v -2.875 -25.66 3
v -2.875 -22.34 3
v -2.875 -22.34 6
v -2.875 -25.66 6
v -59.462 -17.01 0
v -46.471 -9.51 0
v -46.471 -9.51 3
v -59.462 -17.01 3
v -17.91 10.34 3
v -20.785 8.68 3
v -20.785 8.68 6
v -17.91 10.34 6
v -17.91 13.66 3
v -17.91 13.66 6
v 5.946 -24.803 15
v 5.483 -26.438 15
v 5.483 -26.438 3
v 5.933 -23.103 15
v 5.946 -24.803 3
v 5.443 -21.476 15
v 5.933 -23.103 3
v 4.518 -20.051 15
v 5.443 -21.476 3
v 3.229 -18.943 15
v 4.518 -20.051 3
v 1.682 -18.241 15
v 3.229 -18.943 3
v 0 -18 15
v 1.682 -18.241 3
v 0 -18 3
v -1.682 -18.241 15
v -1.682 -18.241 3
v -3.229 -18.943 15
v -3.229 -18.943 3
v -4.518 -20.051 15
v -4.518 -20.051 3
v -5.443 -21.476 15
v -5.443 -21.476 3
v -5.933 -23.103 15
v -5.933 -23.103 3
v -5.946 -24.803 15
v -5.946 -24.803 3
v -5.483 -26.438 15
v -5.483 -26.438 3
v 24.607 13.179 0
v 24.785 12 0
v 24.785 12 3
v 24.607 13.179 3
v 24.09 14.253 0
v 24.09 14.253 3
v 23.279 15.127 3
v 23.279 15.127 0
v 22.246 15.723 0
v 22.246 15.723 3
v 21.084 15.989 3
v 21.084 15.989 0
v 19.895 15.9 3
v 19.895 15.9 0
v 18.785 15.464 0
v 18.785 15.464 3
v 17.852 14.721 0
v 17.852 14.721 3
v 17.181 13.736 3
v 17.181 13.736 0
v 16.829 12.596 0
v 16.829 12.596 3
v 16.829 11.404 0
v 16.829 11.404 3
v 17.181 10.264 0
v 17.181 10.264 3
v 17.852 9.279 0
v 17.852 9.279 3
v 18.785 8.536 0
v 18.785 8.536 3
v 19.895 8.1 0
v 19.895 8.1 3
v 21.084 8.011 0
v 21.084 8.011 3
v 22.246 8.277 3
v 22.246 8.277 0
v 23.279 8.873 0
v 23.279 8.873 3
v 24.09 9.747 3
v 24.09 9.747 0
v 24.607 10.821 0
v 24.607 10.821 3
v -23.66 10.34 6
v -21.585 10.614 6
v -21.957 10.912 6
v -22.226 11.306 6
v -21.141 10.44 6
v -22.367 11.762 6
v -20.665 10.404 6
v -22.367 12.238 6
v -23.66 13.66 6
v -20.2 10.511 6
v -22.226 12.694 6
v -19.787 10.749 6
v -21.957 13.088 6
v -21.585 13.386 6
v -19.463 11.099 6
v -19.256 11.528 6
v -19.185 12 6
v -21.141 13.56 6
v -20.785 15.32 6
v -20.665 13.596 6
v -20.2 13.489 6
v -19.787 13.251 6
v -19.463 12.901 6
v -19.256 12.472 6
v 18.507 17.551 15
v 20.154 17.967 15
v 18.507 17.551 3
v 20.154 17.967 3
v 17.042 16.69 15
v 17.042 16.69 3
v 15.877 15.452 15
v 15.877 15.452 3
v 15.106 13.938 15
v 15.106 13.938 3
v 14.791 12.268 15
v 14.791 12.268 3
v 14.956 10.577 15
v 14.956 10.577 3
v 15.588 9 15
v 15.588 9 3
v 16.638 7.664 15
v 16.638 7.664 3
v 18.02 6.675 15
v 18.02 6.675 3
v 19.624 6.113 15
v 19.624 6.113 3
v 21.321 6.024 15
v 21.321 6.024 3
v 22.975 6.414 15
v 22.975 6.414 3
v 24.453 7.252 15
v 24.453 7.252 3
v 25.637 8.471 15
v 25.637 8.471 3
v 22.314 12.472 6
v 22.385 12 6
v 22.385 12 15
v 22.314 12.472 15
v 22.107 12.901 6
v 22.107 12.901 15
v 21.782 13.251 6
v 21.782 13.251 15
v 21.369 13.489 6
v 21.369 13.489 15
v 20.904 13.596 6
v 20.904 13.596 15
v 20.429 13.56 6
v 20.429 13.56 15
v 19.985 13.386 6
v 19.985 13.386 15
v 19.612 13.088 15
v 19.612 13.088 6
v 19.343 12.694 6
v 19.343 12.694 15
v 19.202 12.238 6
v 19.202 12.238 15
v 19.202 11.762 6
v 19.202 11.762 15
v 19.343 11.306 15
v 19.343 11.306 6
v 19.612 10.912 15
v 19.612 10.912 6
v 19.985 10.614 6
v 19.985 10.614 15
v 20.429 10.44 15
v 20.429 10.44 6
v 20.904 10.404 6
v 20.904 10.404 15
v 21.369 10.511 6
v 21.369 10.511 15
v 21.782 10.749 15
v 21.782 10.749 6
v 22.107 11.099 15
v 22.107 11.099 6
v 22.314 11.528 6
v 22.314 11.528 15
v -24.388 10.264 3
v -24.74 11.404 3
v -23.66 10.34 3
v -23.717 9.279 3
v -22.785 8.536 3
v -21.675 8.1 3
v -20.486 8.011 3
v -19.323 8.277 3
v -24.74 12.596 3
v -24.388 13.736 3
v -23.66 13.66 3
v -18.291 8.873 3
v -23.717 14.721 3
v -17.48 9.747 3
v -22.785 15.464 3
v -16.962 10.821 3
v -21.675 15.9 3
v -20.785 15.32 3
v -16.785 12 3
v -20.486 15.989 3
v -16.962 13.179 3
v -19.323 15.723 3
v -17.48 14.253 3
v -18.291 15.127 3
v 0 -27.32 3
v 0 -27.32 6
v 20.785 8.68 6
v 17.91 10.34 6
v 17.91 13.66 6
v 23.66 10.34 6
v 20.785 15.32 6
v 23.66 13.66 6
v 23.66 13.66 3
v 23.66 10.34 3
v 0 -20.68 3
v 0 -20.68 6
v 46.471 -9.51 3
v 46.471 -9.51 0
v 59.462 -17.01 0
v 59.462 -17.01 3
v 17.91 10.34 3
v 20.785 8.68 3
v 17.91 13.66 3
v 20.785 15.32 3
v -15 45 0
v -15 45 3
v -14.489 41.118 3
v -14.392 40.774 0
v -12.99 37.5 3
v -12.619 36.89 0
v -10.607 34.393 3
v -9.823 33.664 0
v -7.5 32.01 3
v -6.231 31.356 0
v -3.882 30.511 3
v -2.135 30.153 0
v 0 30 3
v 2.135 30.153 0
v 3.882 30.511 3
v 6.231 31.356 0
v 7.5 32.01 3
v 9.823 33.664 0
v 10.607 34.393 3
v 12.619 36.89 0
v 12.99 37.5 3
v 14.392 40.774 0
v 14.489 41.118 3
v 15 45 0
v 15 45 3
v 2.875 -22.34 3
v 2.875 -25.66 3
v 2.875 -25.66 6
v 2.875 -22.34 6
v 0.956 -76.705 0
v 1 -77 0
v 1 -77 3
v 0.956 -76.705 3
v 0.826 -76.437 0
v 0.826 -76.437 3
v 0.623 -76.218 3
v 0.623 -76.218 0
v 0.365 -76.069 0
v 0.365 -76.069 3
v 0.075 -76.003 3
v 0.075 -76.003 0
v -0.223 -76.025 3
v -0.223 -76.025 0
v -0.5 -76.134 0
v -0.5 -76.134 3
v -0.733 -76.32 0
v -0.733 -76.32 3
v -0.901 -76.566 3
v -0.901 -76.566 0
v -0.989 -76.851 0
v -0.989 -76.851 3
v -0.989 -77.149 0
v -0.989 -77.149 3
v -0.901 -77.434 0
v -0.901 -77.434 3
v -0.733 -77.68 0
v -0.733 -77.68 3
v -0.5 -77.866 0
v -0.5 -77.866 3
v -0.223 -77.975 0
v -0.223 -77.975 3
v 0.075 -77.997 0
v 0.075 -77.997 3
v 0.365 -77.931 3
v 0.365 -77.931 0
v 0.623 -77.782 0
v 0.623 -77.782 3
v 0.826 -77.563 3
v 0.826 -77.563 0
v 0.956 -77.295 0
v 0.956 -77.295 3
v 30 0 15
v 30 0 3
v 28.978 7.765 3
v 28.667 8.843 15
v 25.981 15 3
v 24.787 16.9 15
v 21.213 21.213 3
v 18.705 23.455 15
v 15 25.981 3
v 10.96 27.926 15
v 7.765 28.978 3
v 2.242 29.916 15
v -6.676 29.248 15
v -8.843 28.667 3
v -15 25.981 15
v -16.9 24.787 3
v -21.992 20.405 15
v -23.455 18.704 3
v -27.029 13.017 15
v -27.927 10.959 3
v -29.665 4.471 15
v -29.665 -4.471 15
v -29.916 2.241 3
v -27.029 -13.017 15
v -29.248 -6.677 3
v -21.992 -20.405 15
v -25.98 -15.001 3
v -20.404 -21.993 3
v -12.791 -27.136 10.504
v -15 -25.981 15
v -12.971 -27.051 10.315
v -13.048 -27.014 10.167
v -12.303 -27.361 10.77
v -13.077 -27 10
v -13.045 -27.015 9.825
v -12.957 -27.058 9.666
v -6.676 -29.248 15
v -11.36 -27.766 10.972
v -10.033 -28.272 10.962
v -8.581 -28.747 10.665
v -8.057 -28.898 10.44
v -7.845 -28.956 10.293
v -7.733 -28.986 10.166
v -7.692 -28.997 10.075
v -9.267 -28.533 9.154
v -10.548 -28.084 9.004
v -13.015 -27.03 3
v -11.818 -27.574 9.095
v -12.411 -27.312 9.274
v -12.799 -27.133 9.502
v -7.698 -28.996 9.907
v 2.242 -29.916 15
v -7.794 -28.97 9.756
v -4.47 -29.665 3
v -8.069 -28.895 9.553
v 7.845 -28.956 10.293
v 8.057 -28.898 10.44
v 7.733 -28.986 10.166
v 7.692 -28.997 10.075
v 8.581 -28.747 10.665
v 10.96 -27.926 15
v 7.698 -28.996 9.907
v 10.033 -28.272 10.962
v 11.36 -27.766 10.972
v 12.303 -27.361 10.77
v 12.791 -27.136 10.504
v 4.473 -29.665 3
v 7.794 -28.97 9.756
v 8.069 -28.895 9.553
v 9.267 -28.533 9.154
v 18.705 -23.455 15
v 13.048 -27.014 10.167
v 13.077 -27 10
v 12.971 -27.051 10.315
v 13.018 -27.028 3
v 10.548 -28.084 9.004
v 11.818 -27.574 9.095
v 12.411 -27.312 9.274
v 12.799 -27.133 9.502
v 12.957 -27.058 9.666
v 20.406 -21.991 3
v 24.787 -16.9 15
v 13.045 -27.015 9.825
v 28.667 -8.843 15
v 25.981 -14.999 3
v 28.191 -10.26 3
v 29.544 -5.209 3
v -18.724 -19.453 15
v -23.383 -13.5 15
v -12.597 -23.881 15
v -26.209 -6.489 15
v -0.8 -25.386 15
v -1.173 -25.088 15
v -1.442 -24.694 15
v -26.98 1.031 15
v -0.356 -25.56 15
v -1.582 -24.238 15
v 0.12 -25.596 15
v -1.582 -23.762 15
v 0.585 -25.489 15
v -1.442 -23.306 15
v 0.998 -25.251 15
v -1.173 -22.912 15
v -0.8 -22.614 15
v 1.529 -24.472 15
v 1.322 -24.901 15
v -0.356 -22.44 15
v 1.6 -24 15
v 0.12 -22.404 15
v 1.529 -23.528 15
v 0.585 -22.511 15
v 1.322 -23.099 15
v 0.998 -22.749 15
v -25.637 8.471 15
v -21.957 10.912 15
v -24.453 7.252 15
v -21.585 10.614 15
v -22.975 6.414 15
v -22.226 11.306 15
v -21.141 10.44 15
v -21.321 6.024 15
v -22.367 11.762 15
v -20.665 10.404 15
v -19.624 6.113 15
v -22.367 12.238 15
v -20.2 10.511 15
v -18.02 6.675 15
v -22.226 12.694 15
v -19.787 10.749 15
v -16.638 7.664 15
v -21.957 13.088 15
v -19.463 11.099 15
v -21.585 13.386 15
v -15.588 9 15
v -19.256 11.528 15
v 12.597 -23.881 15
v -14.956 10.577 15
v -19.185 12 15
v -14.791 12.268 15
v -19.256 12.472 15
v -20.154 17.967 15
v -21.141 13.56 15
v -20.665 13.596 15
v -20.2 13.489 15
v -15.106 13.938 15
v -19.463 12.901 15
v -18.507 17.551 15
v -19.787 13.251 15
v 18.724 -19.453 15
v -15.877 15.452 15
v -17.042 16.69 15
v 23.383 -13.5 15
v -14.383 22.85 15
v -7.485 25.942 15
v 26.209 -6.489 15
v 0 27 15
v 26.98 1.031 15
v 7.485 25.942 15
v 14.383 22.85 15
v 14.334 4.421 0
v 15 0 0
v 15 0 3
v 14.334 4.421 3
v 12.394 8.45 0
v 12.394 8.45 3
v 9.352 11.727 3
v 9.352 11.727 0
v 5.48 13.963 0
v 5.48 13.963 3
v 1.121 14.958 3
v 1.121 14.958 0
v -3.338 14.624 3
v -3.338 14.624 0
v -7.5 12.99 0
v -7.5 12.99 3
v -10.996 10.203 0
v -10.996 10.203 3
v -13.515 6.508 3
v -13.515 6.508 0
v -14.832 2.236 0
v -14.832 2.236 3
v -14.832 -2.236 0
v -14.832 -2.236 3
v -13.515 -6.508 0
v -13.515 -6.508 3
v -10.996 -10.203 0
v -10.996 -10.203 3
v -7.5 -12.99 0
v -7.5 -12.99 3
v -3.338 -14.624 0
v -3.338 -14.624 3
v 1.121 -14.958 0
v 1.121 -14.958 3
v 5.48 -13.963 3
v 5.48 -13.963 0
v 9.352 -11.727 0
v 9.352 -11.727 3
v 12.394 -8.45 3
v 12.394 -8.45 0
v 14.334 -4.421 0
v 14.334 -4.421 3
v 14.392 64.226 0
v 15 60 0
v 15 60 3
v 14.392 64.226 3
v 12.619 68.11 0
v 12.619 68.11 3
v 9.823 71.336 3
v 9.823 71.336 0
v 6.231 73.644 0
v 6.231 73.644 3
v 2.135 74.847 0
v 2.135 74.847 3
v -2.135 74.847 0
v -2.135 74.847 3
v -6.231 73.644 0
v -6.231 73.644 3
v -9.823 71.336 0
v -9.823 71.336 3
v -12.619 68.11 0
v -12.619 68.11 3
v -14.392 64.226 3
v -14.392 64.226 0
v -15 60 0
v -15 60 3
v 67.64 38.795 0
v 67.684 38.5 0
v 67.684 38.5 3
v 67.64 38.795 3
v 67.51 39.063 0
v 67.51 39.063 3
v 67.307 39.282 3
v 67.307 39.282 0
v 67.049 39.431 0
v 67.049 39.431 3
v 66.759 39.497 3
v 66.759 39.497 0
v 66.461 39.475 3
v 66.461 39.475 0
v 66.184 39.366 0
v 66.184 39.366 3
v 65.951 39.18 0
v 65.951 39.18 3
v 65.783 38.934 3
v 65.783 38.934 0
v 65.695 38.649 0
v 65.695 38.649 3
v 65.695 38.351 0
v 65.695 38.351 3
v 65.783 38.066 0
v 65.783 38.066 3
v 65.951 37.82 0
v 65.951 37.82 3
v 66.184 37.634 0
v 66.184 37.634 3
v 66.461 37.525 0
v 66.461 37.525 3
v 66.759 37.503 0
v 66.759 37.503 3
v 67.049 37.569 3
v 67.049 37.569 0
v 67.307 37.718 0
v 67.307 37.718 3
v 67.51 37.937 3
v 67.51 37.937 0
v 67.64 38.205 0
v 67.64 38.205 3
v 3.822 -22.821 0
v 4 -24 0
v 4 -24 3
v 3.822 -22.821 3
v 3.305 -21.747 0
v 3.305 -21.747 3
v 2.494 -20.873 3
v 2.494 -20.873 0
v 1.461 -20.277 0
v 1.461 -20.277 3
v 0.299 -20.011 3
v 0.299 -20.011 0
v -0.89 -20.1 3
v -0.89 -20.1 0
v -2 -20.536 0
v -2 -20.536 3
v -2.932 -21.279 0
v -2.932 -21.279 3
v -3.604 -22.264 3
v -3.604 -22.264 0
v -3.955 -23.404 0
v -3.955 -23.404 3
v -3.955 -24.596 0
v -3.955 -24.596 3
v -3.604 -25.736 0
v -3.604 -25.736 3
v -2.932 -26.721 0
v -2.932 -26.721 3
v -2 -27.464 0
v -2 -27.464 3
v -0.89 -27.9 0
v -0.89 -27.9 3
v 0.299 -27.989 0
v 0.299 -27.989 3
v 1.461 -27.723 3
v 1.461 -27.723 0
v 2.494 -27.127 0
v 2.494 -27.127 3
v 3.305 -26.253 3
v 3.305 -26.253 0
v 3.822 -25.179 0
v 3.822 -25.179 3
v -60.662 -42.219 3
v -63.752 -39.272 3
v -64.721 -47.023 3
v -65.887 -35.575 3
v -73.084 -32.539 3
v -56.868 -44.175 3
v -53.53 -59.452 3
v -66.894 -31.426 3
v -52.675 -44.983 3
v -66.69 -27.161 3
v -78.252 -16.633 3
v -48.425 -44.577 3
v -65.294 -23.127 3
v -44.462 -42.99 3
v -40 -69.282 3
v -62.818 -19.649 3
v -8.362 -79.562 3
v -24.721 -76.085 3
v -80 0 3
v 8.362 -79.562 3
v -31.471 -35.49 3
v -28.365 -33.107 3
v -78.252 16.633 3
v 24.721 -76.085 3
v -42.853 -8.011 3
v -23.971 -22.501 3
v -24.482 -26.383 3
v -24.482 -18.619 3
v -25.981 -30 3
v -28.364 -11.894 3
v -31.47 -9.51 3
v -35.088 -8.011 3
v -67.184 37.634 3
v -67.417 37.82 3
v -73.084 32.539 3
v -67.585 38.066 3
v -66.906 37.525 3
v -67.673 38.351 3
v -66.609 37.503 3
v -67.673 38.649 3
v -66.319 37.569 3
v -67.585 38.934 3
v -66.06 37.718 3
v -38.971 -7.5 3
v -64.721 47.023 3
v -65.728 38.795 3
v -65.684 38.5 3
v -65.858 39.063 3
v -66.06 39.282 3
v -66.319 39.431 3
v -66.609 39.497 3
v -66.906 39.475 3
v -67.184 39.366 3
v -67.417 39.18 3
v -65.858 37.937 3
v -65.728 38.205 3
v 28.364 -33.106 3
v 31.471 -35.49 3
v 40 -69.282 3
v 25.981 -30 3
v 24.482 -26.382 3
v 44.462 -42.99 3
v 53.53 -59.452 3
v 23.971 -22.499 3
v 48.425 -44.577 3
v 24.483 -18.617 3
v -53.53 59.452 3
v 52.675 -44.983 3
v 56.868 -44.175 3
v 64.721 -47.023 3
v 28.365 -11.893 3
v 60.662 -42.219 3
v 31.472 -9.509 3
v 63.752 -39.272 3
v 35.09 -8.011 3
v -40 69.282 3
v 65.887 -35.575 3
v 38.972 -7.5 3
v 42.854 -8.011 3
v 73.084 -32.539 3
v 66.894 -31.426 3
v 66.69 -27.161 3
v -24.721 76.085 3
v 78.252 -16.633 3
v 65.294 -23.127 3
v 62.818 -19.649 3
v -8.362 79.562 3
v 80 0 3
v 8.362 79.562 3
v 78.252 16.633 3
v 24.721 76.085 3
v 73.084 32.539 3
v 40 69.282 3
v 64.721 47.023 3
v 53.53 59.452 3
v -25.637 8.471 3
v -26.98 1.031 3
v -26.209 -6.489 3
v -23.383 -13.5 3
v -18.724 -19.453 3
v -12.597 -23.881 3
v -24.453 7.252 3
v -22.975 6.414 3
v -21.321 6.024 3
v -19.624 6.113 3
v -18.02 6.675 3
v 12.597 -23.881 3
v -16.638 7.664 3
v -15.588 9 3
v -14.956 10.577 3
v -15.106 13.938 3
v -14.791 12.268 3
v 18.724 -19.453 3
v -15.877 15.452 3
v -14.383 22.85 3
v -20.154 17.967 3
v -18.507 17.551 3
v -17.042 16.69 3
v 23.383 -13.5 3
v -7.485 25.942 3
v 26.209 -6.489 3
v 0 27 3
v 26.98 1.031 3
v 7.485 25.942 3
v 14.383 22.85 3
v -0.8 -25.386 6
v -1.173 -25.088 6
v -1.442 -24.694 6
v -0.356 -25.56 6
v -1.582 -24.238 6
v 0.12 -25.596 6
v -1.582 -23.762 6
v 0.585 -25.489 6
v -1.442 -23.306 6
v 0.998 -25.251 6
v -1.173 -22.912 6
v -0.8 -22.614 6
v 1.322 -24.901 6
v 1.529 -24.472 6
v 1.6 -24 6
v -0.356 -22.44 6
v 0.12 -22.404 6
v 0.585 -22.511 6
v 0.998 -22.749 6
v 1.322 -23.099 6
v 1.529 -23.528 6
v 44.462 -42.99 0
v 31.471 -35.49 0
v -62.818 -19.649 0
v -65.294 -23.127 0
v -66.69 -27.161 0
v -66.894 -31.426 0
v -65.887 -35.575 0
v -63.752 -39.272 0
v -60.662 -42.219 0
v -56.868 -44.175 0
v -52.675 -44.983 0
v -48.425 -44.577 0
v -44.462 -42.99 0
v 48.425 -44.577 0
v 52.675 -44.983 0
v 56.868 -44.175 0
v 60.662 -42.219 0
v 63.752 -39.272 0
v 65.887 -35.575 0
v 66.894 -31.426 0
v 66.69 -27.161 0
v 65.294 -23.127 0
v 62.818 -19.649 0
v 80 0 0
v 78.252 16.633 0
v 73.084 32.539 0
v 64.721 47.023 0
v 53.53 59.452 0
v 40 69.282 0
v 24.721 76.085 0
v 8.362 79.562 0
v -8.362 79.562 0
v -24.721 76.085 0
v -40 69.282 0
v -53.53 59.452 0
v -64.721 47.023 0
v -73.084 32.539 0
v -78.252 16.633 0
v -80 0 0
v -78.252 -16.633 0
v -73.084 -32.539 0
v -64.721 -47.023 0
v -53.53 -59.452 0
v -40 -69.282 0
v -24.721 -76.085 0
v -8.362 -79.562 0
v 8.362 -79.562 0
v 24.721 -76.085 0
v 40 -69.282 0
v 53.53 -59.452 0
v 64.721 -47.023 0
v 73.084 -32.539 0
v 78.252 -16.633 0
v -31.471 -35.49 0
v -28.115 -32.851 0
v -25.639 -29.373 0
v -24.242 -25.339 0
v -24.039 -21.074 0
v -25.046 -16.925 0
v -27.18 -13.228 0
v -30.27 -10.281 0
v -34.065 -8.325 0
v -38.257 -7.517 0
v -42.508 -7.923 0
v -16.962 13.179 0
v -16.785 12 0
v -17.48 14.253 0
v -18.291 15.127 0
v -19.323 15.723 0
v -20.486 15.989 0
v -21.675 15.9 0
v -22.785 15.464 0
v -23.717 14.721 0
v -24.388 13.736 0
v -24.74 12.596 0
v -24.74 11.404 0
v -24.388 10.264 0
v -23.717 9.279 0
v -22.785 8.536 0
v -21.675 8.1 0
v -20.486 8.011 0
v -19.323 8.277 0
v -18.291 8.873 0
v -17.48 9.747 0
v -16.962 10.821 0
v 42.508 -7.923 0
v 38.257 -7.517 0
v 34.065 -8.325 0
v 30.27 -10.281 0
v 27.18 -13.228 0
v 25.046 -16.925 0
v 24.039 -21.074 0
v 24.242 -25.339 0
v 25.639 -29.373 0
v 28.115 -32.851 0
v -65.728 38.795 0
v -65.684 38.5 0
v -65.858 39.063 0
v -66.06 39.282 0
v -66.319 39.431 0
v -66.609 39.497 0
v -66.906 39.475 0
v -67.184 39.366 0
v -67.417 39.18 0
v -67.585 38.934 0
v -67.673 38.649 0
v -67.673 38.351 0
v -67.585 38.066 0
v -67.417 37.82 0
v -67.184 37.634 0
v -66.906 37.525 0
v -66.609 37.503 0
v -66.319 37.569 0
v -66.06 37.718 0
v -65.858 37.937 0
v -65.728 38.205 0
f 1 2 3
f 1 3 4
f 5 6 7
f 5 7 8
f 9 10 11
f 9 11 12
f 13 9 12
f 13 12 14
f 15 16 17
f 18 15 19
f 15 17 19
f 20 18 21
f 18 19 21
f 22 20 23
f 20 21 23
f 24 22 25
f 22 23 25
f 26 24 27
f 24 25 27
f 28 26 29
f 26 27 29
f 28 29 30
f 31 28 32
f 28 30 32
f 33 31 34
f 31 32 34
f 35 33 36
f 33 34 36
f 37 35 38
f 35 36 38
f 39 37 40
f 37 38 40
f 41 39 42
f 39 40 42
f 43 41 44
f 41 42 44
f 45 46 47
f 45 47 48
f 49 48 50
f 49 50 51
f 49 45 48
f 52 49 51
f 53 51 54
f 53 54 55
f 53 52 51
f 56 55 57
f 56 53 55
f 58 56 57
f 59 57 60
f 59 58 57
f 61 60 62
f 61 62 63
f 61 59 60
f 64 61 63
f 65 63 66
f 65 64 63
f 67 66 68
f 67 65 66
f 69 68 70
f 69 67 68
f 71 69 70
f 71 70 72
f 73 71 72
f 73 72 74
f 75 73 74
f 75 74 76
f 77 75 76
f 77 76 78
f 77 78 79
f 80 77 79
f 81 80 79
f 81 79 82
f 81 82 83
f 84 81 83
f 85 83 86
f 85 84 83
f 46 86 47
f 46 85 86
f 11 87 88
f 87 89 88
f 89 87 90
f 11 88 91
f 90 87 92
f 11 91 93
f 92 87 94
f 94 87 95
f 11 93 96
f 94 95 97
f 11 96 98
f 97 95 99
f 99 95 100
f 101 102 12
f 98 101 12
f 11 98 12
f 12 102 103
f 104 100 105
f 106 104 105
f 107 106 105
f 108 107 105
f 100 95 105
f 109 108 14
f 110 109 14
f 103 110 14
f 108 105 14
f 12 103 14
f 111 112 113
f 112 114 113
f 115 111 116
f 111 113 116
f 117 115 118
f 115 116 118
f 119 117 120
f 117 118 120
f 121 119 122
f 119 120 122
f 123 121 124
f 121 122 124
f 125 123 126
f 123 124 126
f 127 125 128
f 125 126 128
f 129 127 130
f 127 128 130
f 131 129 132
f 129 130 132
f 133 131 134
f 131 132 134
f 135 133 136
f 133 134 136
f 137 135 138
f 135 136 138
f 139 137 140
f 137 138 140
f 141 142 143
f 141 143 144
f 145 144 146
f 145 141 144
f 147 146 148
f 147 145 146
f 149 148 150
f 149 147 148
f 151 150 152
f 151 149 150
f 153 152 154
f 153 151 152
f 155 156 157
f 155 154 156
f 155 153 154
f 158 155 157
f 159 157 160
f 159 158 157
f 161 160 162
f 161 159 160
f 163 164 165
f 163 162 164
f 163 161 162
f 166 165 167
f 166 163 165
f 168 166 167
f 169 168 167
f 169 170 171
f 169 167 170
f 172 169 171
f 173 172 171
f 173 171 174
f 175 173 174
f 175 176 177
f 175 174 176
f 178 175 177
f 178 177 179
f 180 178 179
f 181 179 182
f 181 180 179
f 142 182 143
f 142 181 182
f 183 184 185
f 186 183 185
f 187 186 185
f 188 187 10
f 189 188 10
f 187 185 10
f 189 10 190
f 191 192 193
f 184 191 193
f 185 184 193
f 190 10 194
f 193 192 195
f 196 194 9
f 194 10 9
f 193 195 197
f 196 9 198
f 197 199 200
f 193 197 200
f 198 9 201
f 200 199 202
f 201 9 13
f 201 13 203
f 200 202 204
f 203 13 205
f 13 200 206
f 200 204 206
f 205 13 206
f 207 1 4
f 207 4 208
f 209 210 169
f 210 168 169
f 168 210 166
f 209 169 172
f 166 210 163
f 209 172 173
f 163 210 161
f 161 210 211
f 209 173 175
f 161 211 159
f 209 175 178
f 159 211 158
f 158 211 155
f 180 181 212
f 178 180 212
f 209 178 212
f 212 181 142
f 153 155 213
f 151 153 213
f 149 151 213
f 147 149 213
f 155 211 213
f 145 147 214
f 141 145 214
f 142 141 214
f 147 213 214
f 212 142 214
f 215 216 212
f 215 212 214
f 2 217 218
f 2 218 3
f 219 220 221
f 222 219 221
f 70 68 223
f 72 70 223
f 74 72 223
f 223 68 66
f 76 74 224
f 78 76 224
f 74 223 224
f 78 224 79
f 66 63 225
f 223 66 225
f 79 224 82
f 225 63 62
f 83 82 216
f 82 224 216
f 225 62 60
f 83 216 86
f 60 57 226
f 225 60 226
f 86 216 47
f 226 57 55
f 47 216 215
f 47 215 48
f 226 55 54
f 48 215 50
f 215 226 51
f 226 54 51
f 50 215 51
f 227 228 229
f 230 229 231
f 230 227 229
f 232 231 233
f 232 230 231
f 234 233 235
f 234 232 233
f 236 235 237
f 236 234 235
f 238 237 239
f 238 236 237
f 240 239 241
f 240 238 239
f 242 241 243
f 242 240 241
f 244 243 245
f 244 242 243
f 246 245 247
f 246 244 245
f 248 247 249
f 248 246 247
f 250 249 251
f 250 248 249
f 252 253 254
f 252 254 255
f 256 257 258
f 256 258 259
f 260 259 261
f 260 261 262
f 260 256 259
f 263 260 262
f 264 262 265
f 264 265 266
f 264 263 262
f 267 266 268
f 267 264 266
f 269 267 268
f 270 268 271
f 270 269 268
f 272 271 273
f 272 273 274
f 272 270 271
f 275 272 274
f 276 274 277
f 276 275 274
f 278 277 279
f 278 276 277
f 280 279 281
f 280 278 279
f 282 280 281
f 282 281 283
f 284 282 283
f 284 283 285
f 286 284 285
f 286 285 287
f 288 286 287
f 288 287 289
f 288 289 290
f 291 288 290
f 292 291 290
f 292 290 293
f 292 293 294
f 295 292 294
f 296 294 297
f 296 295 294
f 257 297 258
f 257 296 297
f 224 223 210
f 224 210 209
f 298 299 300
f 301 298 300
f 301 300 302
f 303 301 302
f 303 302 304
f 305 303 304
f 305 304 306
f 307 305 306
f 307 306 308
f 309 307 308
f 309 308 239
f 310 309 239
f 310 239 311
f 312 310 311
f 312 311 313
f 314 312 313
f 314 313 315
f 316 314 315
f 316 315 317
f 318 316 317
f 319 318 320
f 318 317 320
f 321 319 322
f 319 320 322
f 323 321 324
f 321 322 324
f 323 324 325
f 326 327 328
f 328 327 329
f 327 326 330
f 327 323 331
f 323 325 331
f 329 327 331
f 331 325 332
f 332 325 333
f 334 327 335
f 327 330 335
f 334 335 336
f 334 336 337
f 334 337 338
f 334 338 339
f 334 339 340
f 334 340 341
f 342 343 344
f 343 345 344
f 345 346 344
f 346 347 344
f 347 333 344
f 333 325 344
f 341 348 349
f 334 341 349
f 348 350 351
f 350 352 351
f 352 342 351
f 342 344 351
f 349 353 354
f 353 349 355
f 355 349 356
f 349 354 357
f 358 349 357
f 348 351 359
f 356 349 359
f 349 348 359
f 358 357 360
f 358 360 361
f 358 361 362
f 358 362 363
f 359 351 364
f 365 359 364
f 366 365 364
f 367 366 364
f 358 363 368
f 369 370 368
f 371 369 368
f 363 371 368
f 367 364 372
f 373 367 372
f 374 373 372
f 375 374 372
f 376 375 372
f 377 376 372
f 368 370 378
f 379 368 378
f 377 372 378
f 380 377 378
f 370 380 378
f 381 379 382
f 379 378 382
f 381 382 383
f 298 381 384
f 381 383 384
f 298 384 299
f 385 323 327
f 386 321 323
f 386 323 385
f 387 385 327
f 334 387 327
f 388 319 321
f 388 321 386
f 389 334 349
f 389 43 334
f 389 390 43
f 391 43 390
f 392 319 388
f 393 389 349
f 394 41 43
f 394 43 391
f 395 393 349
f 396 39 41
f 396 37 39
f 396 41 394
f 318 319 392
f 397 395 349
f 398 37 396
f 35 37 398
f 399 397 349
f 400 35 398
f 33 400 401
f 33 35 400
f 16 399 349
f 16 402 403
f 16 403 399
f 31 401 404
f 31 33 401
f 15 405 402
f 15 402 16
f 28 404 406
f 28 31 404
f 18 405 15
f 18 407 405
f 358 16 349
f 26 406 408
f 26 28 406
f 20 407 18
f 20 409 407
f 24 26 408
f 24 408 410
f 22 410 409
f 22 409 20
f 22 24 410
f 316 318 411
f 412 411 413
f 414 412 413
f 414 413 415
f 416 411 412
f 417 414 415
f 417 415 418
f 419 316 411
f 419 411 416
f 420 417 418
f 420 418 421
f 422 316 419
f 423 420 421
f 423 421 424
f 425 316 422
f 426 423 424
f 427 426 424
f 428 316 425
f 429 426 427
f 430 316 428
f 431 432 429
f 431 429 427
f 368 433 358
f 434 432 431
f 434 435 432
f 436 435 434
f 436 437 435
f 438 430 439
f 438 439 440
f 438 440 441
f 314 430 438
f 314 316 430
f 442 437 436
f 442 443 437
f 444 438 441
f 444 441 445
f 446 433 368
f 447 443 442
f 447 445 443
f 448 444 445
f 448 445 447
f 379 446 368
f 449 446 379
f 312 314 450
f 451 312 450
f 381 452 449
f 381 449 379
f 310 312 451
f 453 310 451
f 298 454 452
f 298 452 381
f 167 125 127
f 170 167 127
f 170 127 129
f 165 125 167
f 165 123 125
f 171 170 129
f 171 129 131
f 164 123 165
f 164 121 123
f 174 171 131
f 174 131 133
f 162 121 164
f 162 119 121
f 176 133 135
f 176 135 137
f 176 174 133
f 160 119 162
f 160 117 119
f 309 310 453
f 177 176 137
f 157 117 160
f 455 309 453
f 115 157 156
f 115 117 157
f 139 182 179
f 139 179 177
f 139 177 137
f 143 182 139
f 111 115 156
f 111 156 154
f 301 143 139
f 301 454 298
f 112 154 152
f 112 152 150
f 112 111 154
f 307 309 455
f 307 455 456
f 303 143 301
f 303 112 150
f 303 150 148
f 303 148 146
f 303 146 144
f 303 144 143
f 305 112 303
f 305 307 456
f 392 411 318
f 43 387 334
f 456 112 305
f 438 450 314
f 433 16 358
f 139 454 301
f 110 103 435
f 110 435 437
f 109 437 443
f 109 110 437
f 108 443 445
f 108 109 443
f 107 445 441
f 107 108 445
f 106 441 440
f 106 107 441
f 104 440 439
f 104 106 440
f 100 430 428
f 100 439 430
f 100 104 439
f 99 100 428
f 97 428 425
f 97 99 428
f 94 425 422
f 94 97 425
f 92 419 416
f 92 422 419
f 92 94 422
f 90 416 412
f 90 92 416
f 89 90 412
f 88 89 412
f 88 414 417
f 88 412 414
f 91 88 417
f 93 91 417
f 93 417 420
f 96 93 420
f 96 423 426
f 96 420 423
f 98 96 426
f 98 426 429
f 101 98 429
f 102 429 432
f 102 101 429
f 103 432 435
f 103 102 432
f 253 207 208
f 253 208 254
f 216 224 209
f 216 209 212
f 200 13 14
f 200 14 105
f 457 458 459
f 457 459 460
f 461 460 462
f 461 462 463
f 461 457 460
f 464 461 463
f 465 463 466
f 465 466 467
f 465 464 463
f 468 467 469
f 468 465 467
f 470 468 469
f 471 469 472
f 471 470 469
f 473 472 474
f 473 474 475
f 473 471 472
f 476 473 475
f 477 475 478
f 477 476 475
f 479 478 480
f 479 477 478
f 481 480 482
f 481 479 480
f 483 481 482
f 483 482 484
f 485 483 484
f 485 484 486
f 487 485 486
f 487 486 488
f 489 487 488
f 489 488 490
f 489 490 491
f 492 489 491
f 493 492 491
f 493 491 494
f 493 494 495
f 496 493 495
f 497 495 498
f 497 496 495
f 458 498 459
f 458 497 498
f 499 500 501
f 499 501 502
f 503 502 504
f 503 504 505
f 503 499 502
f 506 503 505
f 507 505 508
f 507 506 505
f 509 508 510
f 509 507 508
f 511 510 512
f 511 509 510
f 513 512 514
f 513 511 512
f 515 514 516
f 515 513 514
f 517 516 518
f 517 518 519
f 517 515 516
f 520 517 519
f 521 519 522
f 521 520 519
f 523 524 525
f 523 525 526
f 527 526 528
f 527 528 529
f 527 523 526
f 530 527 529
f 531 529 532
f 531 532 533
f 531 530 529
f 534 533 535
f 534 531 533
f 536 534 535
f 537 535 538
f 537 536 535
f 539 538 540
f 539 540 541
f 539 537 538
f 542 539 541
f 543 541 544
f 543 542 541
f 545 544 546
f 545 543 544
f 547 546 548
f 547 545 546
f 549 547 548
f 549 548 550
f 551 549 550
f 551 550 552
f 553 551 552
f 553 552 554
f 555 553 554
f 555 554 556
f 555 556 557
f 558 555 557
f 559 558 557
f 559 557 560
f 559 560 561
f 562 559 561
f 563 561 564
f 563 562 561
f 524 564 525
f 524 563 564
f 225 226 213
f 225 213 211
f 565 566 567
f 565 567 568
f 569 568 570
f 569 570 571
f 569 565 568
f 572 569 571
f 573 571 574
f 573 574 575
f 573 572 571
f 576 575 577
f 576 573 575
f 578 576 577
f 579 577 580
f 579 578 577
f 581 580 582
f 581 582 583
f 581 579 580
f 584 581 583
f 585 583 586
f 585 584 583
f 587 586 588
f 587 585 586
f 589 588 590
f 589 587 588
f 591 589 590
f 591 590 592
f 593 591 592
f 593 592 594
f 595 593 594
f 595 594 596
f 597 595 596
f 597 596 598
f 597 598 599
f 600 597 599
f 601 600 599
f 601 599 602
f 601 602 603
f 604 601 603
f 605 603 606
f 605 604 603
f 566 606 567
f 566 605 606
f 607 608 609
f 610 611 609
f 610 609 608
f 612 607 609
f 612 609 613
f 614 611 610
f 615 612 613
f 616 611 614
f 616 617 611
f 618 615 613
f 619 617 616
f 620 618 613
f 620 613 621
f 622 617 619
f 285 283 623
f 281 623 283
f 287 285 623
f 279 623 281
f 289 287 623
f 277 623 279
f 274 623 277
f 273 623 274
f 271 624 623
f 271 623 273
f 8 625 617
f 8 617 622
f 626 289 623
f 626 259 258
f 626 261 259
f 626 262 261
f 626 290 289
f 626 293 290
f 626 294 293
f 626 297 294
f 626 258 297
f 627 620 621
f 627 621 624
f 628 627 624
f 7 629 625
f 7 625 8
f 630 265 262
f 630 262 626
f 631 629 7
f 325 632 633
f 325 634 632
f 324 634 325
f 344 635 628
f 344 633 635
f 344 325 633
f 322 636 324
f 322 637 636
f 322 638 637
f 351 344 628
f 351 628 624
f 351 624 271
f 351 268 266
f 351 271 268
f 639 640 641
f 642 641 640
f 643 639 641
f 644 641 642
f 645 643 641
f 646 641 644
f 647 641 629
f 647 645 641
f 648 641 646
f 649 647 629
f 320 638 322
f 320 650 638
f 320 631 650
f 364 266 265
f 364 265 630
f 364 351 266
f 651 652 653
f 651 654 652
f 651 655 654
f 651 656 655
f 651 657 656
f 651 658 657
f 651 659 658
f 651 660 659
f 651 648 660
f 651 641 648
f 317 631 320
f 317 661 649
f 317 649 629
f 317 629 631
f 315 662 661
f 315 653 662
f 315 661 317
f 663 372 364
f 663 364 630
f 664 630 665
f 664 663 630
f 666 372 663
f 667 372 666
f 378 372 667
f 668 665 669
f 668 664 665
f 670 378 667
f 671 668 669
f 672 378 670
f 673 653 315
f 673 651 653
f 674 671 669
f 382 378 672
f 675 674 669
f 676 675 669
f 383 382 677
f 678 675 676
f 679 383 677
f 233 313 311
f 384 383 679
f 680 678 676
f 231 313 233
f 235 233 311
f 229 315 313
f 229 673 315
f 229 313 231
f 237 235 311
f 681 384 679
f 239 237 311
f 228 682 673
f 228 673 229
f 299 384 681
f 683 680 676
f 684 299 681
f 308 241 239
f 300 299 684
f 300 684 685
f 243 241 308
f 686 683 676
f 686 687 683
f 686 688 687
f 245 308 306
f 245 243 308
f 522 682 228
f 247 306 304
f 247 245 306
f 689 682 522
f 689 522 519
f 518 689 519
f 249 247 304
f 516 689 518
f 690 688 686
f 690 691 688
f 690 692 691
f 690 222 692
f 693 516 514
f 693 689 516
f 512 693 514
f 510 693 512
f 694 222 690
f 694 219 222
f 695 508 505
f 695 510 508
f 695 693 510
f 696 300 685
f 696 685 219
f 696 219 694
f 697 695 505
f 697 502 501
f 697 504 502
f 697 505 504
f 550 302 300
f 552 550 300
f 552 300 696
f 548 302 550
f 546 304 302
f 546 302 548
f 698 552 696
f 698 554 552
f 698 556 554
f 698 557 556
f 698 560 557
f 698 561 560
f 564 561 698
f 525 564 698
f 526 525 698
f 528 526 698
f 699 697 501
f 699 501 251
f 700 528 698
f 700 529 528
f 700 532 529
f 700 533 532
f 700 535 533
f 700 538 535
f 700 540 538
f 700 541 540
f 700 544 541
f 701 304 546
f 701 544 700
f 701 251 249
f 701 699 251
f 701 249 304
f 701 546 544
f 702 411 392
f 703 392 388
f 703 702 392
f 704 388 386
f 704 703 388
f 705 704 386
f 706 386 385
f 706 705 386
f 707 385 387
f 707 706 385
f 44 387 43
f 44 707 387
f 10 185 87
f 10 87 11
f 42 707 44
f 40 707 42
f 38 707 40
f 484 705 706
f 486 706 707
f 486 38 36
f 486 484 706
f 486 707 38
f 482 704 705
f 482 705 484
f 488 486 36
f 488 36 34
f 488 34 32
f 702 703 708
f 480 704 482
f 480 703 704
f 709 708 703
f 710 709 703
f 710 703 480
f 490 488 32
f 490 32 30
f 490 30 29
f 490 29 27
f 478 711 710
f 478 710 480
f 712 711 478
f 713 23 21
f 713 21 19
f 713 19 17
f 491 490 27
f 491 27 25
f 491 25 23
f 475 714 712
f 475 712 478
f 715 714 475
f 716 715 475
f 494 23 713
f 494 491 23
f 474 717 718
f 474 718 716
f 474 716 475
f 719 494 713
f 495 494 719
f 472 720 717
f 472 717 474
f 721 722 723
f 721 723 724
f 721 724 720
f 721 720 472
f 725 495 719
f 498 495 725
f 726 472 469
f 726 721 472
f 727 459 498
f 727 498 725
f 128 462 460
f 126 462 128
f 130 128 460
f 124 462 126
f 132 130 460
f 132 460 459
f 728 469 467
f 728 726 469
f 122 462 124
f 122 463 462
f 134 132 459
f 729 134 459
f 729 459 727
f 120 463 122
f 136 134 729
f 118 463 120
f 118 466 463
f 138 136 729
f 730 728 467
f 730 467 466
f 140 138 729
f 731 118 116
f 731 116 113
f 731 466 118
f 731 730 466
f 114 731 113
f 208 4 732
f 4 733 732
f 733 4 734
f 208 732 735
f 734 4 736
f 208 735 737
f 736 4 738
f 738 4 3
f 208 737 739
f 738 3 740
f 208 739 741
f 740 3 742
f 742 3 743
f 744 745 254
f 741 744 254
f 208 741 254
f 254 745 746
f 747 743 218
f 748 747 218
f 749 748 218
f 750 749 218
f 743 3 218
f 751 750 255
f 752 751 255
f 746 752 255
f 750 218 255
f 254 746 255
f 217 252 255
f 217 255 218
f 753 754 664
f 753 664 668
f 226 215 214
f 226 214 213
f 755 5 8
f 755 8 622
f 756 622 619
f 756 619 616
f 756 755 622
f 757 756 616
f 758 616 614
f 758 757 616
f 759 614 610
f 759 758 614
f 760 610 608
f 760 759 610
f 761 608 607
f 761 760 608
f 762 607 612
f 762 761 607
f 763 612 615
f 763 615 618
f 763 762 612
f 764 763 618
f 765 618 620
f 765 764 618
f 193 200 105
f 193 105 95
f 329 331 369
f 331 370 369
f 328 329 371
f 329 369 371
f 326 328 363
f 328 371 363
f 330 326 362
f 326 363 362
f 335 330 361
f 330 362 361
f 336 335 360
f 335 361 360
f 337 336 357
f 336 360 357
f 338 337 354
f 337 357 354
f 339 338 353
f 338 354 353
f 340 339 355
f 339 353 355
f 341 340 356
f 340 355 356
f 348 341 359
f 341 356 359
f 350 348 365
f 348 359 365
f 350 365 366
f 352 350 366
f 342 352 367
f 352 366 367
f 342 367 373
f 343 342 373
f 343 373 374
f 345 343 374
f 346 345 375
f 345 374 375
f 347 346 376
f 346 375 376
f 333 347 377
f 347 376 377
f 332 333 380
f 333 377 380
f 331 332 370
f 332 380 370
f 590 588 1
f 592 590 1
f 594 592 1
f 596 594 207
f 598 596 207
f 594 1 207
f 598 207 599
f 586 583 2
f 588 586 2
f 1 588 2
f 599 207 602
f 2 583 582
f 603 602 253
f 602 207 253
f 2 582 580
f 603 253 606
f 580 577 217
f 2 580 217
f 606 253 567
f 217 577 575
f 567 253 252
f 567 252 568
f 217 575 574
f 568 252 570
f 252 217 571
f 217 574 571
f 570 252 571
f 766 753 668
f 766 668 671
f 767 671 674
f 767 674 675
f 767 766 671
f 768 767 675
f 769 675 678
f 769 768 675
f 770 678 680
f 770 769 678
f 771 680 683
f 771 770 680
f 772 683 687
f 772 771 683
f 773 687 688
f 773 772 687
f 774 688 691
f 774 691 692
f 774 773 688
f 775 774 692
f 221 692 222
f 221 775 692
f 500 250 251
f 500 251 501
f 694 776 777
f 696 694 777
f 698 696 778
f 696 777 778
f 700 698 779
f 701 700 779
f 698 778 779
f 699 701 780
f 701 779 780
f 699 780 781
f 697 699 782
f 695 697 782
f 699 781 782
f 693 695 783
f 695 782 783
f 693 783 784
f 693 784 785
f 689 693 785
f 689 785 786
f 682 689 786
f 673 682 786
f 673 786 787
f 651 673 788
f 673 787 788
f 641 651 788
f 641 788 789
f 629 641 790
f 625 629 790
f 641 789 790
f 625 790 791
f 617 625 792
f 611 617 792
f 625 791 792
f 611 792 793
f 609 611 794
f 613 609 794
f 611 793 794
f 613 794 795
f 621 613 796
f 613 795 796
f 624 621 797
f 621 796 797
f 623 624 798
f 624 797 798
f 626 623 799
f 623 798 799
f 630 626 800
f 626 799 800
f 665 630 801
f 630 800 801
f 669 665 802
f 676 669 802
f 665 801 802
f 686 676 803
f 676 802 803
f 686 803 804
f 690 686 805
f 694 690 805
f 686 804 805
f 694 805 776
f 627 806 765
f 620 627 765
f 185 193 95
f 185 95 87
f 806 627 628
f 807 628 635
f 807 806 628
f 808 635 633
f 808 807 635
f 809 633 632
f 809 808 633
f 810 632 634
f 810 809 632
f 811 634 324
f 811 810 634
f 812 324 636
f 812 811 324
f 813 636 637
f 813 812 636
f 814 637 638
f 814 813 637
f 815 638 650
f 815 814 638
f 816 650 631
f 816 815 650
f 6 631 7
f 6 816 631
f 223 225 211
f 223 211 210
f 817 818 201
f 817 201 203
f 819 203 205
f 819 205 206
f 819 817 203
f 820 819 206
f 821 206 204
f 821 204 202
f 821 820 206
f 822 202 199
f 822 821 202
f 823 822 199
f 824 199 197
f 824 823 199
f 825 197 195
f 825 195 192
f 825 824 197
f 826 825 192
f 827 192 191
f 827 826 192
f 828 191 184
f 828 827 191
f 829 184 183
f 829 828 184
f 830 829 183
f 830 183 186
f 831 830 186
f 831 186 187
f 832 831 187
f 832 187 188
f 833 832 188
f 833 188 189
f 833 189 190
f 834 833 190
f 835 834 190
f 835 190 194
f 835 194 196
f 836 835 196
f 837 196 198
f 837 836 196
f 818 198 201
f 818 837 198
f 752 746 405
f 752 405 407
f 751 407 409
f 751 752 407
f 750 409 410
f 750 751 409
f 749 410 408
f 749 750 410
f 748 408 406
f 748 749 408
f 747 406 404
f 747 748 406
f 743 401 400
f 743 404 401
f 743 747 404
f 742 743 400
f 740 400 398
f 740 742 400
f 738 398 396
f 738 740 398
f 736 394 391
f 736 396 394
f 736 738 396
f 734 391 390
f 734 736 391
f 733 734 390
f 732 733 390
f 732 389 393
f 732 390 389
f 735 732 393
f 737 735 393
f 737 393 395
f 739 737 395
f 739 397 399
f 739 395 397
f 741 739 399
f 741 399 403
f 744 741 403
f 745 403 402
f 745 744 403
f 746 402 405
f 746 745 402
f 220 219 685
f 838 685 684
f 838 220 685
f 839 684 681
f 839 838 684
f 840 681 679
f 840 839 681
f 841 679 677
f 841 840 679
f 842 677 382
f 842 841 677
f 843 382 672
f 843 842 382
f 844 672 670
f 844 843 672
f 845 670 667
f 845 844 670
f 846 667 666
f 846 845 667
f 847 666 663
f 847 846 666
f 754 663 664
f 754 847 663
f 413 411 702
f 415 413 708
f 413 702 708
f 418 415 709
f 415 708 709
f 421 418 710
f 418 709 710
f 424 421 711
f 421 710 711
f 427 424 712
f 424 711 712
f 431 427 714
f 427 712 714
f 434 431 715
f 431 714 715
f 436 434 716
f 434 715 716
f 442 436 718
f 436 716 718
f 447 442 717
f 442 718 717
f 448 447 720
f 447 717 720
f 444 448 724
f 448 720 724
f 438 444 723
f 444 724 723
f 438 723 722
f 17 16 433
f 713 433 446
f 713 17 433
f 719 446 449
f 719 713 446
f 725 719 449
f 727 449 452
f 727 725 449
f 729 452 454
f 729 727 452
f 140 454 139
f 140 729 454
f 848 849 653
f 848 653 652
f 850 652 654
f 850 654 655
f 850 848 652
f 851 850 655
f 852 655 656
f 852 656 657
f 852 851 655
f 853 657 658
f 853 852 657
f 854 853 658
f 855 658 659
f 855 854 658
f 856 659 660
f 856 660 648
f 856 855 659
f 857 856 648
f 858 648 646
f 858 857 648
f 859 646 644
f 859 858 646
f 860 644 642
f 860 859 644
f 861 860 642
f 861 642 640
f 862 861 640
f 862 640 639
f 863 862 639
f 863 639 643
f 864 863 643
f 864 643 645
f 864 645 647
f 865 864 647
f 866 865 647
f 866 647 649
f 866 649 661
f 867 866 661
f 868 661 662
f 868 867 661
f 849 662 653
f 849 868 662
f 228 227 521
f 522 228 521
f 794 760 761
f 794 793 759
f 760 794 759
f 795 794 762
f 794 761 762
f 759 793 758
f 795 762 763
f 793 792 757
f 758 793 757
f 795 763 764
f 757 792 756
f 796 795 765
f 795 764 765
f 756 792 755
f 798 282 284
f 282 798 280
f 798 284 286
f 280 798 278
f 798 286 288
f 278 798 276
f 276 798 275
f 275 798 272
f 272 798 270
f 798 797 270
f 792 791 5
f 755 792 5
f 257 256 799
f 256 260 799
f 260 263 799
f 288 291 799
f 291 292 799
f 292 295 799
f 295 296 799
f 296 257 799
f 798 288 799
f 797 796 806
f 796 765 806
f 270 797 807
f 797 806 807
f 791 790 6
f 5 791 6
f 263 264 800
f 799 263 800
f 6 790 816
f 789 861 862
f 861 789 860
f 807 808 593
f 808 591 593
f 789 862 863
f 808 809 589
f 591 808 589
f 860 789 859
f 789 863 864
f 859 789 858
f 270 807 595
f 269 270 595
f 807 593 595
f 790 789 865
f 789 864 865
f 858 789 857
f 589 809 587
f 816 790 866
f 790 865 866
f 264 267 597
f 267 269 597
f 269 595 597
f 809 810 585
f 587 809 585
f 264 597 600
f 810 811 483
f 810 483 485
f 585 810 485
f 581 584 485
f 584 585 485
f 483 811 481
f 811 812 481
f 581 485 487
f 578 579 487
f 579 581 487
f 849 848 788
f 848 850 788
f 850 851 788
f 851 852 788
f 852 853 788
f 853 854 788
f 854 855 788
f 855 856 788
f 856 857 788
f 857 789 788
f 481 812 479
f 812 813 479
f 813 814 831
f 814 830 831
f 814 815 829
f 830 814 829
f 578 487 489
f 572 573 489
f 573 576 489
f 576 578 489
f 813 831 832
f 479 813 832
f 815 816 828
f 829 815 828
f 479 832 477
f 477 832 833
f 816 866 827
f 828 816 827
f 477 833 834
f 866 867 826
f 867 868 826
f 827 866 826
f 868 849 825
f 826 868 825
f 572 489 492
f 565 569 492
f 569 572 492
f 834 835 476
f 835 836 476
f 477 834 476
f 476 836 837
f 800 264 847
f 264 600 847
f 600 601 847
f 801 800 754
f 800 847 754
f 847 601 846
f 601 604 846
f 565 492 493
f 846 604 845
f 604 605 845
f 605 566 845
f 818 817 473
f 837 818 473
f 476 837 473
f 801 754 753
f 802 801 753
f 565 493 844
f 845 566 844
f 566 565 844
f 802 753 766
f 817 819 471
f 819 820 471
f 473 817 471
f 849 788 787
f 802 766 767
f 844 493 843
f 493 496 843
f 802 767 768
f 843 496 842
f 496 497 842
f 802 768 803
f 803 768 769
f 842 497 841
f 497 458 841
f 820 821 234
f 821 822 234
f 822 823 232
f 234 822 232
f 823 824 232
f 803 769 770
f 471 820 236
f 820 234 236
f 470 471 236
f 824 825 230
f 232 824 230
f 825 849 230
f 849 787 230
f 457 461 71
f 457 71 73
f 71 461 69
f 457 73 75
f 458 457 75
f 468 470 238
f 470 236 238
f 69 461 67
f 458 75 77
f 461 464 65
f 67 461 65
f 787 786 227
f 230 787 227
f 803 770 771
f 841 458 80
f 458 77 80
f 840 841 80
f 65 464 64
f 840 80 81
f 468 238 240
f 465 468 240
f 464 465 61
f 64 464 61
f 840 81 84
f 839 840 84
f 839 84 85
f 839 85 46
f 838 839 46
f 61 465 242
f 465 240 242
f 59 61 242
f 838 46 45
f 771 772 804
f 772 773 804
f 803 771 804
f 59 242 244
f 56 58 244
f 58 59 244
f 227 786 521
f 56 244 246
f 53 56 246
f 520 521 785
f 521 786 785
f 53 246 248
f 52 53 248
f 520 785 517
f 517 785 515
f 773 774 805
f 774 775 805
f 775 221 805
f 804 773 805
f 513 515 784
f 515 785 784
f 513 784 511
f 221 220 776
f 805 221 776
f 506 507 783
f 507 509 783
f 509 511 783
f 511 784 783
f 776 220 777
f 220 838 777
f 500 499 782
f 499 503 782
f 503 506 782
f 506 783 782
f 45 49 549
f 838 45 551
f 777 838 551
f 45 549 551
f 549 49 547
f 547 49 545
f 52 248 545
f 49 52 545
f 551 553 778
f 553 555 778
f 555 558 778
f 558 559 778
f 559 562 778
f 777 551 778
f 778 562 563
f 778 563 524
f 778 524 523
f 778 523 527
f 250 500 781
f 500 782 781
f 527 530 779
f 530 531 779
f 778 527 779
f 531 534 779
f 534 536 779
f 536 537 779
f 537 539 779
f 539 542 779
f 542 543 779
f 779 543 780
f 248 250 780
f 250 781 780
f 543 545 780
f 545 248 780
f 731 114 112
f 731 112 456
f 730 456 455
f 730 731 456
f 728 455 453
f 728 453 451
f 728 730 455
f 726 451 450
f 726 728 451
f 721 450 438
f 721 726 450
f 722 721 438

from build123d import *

# Parameters (mm, degrees)
SKETCH_R             = 80
SKETCH_R_2           = 15
SKETCH_R_3           = 1
PAD_DEPTH            = 3
SKETCH001_R          = 30
SKETCH001_R_2        = 27
PAD001_DEPTH         = 15
SKETCH002_R          = 6
PAD002_DEPTH         = 15
SKETCH004_R          = 1.6
POCKET_DEPTH         = 15.001
SKETCH003_R          = 4
POCKET001_DEPTH      = 3
SKETCH005_R          = 1
POCKET002_DEPTH      = 80.001
POCKET002_DEPTH_BACK = -80.001
POCKET003_DEPTH      = 6


with BuildPart() as part:
    # Sketch → Pad (new body)
    with BuildSketch(Plane.XY):
        Circle(SKETCH_R)
        Circle(SKETCH_R_2, mode=Mode.SUBTRACT)
        with Locations((-66.683956, 38.5)):
            Circle(SKETCH_R_3, mode=Mode.SUBTRACT)
        with Locations((66.683956, 38.5)):
            Circle(SKETCH_R_3, mode=Mode.SUBTRACT)
        with Locations((0, -77)):
            Circle(SKETCH_R_3, mode=Mode.SUBTRACT)
        with BuildLine():
            ThreePointArc((-15, 45), (0, 30), (15, 45))
            Line((15, 45), (15, 60))
            ThreePointArc((15, 60), (0, 75), (-15, 60))
            Line((-15, 45), (-15, 60))
        make_face(mode=Mode.SUBTRACT)
        with BuildLine():
            ThreePointArc((-31.471143, -35.490381), (-25.980762, -15), (-46.471143, -9.509619))
            Line((-46.471143, -9.509619), (-59.461524, -17.009619))
            ThreePointArc((-59.461524, -17.009619), (-64.951905, -37.5), (-44.461524, -42.990381))
            Line((-31.471143, -35.490381), (-44.461524, -42.990381))
        make_face(mode=Mode.SUBTRACT)
        with BuildLine():
            ThreePointArc((46.471143, -9.509619), (25.980762, -15), (31.471143, -35.490381))
            Line((31.471143, -35.490381), (44.461524, -42.990381))
            ThreePointArc((44.461524, -42.990381), (64.951905, -37.5), (59.461524, -17.009619))
            Line((46.471143, -9.509619), (59.461524, -17.009619))
        make_face(mode=Mode.SUBTRACT)
    extrude(amount=PAD_DEPTH)

    # Sketch001 → Pad001 (join)
    with BuildSketch(Plane.XY):
        Circle(SKETCH001_R)
        Circle(SKETCH001_R_2, mode=Mode.SUBTRACT)
    extrude(amount=PAD001_DEPTH)

    # Sketch002 → Pad002 (join)
    with BuildSketch(Plane.XY):
        with Locations((-20.78461, 12)):
            Circle(SKETCH002_R)
        with Locations((0, -24)):
            Circle(SKETCH002_R)
        with Locations((20.78461, 12)):
            Circle(SKETCH002_R)
    extrude(amount=PAD002_DEPTH)

    # Sketch004 → Pocket (cut, through all)
    with BuildSketch(Plane.XY):
        with Locations((-20.78461, 12)):
            Circle(SKETCH004_R)
        with Locations((20.78461, 12)):
            Circle(SKETCH004_R)
        with Locations((0, -24)):
            Circle(SKETCH004_R)
    extrude(amount=POCKET_DEPTH, mode=Mode.SUBTRACT)

    # Sketch003 → Pocket001 (cut)
    with BuildSketch(Plane.XY):
        with Locations((-20.78461, 12)):
            Circle(SKETCH003_R)
        with Locations((20.78461, 12)):
            Circle(SKETCH003_R)
        with Locations((0, -24)):
            Circle(SKETCH003_R)
    extrude(amount=POCKET001_DEPTH, mode=Mode.SUBTRACT)

    # Sketch005 → Pocket002 (cut, two sides)
    with BuildSketch(Plane.YZ) as pocket002_sk:
        with Locations((-28, 10)):
            Circle(SKETCH005_R)
    extrude(amount=-POCKET002_DEPTH, mode=Mode.SUBTRACT)
    extrude(pocket002_sk.sketch, amount=-POCKET002_DEPTH_BACK, mode=Mode.SUBTRACT)

    # Sketch006 → Pocket003 (cut)
    with BuildSketch(Plane.XY):
        Polygon((-17.90961, 10.340118), (-17.90961, 13.659882), (-20.78461, 15.319764), (-23.65961, 13.659882), (-23.65961, 10.340118), (-20.78461, 8.680236), align=None)
        Polygon((20.78461, 8.680236), (23.65961, 10.340118), (23.65961, 13.659882), (20.78461, 15.319764), (17.90961, 13.659882), (17.90961, 10.340118), align=None)
        Polygon((2.875, -25.659882), (2.875, -22.340118), (0, -20.680236), (-2.875, -22.340118), (-2.875, -25.659882), (0, -27.319764), align=None)
    extrude(amount=POCKET003_DEPTH, mode=Mode.SUBTRACT)


solid = part.part
